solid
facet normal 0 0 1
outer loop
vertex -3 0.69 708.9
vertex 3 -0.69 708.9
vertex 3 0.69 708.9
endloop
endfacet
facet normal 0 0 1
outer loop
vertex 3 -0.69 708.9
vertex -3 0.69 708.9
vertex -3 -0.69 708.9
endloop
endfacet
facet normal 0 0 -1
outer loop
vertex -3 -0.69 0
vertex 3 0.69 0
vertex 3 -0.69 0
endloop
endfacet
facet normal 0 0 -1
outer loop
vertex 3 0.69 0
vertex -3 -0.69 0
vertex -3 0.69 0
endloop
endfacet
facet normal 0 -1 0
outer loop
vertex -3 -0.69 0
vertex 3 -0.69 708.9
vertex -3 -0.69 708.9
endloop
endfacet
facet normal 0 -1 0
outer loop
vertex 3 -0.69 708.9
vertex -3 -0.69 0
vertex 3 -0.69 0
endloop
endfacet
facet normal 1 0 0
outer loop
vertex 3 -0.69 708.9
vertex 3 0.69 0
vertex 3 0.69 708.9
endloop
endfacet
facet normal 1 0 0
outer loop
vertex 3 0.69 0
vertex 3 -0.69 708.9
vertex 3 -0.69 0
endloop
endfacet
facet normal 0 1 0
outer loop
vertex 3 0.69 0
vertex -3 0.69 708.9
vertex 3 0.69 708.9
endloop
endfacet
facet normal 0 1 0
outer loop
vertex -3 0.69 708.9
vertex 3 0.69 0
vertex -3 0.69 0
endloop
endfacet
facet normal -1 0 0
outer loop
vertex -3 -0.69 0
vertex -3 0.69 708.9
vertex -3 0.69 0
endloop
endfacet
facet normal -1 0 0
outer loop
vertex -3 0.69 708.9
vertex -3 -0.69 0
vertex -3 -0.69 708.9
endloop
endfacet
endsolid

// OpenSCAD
// file: konfiguracja.scad
/*
    PARAMETRY UKŁADU
*/
    // WIELKOŚCI GŁÓWNE
 
     //MKY3
     //dg
    srednica_grzalki=[214,214];
        
    //dw
    //Średnica wałka prowadzącego
    srednica_walka=8;
    
    //H
    // Wysokość konstrukcji (zależna od prowadnic fi8) [H]
    // Wysokosc manipulatora (750mm) wynika z założonego materiału (długość pręta fi8 150cm)
    wysokosc_konstrukcji=750;


    // WIELKOŚCI INNE
    
    
    // Wysokość dolnej podstawy od ziemii   [h]
    //(motor_end_height)
    wysokosc_podstawy=62.3;
    
    
    // Grubość podstawy górnej i dolnej
    grubosc_podstawy=8;
    
    // Wysokość stołu grzejnego wraz z grubością
    wysokosc_grzalki=2;
    
    
    
    //Zaokrąglenie podstawy
    corner_radius=12;
    
    //Grubość platformy roboczej
    grubosc_platformy=8;
    

    // WARTOŚCI OBLICZONE
    
    //rk
    promien_konstrukcji = srednica_grzalki[0]*0.9;
    //192,6mm
    // wyznaczenie położenia prętów i innych elekentów konstrukcji od środka układu współrzędnych
    
    dlugosc_ramion=srednica_grzalki[0]*1.2;
    //259,2

    //Promień podstawy
    //frame_radius
    promien_podstawy=(promien_konstrukcji-srednica_walka/2-1.9*corner_radius)/cos(30);
    platform_hinge_offset=33;
    carriage_hinge_offset=22;             // default rostock mini platform
    wysokosc_wozka=32;
    idler_end_height=32; 
    
    //echo
    echo("Promień konstrukcji",promien_konstrukcji);
    echo("Długość ramion",dlugosc_ramion);
    echo("Promień podstawy",promien_podstawy);
    
    dlugosc_tasmy=ceil((25*3.14/2)+((22+0)*3.14/2)+2*(wysokosc_konstrukcji-42.3/2-5-14.95));
    echo("Długość taśmy",dlugosc_tasmy,"mm");
    ilosc_modulow=dlugosc_tasmy/2;
    echo("Ilość modułów",ilosc_modulow);
// main file
include <konfiguracja.scad>


h=wysokosc_konstrukcji-42.3/2-5-14.95;

module tasma()
{
    color([0, 0, 0.0, 1]) 
    cube([6,1.38,h],center=true);
}
translate([0,0,h/2]) tasma();
